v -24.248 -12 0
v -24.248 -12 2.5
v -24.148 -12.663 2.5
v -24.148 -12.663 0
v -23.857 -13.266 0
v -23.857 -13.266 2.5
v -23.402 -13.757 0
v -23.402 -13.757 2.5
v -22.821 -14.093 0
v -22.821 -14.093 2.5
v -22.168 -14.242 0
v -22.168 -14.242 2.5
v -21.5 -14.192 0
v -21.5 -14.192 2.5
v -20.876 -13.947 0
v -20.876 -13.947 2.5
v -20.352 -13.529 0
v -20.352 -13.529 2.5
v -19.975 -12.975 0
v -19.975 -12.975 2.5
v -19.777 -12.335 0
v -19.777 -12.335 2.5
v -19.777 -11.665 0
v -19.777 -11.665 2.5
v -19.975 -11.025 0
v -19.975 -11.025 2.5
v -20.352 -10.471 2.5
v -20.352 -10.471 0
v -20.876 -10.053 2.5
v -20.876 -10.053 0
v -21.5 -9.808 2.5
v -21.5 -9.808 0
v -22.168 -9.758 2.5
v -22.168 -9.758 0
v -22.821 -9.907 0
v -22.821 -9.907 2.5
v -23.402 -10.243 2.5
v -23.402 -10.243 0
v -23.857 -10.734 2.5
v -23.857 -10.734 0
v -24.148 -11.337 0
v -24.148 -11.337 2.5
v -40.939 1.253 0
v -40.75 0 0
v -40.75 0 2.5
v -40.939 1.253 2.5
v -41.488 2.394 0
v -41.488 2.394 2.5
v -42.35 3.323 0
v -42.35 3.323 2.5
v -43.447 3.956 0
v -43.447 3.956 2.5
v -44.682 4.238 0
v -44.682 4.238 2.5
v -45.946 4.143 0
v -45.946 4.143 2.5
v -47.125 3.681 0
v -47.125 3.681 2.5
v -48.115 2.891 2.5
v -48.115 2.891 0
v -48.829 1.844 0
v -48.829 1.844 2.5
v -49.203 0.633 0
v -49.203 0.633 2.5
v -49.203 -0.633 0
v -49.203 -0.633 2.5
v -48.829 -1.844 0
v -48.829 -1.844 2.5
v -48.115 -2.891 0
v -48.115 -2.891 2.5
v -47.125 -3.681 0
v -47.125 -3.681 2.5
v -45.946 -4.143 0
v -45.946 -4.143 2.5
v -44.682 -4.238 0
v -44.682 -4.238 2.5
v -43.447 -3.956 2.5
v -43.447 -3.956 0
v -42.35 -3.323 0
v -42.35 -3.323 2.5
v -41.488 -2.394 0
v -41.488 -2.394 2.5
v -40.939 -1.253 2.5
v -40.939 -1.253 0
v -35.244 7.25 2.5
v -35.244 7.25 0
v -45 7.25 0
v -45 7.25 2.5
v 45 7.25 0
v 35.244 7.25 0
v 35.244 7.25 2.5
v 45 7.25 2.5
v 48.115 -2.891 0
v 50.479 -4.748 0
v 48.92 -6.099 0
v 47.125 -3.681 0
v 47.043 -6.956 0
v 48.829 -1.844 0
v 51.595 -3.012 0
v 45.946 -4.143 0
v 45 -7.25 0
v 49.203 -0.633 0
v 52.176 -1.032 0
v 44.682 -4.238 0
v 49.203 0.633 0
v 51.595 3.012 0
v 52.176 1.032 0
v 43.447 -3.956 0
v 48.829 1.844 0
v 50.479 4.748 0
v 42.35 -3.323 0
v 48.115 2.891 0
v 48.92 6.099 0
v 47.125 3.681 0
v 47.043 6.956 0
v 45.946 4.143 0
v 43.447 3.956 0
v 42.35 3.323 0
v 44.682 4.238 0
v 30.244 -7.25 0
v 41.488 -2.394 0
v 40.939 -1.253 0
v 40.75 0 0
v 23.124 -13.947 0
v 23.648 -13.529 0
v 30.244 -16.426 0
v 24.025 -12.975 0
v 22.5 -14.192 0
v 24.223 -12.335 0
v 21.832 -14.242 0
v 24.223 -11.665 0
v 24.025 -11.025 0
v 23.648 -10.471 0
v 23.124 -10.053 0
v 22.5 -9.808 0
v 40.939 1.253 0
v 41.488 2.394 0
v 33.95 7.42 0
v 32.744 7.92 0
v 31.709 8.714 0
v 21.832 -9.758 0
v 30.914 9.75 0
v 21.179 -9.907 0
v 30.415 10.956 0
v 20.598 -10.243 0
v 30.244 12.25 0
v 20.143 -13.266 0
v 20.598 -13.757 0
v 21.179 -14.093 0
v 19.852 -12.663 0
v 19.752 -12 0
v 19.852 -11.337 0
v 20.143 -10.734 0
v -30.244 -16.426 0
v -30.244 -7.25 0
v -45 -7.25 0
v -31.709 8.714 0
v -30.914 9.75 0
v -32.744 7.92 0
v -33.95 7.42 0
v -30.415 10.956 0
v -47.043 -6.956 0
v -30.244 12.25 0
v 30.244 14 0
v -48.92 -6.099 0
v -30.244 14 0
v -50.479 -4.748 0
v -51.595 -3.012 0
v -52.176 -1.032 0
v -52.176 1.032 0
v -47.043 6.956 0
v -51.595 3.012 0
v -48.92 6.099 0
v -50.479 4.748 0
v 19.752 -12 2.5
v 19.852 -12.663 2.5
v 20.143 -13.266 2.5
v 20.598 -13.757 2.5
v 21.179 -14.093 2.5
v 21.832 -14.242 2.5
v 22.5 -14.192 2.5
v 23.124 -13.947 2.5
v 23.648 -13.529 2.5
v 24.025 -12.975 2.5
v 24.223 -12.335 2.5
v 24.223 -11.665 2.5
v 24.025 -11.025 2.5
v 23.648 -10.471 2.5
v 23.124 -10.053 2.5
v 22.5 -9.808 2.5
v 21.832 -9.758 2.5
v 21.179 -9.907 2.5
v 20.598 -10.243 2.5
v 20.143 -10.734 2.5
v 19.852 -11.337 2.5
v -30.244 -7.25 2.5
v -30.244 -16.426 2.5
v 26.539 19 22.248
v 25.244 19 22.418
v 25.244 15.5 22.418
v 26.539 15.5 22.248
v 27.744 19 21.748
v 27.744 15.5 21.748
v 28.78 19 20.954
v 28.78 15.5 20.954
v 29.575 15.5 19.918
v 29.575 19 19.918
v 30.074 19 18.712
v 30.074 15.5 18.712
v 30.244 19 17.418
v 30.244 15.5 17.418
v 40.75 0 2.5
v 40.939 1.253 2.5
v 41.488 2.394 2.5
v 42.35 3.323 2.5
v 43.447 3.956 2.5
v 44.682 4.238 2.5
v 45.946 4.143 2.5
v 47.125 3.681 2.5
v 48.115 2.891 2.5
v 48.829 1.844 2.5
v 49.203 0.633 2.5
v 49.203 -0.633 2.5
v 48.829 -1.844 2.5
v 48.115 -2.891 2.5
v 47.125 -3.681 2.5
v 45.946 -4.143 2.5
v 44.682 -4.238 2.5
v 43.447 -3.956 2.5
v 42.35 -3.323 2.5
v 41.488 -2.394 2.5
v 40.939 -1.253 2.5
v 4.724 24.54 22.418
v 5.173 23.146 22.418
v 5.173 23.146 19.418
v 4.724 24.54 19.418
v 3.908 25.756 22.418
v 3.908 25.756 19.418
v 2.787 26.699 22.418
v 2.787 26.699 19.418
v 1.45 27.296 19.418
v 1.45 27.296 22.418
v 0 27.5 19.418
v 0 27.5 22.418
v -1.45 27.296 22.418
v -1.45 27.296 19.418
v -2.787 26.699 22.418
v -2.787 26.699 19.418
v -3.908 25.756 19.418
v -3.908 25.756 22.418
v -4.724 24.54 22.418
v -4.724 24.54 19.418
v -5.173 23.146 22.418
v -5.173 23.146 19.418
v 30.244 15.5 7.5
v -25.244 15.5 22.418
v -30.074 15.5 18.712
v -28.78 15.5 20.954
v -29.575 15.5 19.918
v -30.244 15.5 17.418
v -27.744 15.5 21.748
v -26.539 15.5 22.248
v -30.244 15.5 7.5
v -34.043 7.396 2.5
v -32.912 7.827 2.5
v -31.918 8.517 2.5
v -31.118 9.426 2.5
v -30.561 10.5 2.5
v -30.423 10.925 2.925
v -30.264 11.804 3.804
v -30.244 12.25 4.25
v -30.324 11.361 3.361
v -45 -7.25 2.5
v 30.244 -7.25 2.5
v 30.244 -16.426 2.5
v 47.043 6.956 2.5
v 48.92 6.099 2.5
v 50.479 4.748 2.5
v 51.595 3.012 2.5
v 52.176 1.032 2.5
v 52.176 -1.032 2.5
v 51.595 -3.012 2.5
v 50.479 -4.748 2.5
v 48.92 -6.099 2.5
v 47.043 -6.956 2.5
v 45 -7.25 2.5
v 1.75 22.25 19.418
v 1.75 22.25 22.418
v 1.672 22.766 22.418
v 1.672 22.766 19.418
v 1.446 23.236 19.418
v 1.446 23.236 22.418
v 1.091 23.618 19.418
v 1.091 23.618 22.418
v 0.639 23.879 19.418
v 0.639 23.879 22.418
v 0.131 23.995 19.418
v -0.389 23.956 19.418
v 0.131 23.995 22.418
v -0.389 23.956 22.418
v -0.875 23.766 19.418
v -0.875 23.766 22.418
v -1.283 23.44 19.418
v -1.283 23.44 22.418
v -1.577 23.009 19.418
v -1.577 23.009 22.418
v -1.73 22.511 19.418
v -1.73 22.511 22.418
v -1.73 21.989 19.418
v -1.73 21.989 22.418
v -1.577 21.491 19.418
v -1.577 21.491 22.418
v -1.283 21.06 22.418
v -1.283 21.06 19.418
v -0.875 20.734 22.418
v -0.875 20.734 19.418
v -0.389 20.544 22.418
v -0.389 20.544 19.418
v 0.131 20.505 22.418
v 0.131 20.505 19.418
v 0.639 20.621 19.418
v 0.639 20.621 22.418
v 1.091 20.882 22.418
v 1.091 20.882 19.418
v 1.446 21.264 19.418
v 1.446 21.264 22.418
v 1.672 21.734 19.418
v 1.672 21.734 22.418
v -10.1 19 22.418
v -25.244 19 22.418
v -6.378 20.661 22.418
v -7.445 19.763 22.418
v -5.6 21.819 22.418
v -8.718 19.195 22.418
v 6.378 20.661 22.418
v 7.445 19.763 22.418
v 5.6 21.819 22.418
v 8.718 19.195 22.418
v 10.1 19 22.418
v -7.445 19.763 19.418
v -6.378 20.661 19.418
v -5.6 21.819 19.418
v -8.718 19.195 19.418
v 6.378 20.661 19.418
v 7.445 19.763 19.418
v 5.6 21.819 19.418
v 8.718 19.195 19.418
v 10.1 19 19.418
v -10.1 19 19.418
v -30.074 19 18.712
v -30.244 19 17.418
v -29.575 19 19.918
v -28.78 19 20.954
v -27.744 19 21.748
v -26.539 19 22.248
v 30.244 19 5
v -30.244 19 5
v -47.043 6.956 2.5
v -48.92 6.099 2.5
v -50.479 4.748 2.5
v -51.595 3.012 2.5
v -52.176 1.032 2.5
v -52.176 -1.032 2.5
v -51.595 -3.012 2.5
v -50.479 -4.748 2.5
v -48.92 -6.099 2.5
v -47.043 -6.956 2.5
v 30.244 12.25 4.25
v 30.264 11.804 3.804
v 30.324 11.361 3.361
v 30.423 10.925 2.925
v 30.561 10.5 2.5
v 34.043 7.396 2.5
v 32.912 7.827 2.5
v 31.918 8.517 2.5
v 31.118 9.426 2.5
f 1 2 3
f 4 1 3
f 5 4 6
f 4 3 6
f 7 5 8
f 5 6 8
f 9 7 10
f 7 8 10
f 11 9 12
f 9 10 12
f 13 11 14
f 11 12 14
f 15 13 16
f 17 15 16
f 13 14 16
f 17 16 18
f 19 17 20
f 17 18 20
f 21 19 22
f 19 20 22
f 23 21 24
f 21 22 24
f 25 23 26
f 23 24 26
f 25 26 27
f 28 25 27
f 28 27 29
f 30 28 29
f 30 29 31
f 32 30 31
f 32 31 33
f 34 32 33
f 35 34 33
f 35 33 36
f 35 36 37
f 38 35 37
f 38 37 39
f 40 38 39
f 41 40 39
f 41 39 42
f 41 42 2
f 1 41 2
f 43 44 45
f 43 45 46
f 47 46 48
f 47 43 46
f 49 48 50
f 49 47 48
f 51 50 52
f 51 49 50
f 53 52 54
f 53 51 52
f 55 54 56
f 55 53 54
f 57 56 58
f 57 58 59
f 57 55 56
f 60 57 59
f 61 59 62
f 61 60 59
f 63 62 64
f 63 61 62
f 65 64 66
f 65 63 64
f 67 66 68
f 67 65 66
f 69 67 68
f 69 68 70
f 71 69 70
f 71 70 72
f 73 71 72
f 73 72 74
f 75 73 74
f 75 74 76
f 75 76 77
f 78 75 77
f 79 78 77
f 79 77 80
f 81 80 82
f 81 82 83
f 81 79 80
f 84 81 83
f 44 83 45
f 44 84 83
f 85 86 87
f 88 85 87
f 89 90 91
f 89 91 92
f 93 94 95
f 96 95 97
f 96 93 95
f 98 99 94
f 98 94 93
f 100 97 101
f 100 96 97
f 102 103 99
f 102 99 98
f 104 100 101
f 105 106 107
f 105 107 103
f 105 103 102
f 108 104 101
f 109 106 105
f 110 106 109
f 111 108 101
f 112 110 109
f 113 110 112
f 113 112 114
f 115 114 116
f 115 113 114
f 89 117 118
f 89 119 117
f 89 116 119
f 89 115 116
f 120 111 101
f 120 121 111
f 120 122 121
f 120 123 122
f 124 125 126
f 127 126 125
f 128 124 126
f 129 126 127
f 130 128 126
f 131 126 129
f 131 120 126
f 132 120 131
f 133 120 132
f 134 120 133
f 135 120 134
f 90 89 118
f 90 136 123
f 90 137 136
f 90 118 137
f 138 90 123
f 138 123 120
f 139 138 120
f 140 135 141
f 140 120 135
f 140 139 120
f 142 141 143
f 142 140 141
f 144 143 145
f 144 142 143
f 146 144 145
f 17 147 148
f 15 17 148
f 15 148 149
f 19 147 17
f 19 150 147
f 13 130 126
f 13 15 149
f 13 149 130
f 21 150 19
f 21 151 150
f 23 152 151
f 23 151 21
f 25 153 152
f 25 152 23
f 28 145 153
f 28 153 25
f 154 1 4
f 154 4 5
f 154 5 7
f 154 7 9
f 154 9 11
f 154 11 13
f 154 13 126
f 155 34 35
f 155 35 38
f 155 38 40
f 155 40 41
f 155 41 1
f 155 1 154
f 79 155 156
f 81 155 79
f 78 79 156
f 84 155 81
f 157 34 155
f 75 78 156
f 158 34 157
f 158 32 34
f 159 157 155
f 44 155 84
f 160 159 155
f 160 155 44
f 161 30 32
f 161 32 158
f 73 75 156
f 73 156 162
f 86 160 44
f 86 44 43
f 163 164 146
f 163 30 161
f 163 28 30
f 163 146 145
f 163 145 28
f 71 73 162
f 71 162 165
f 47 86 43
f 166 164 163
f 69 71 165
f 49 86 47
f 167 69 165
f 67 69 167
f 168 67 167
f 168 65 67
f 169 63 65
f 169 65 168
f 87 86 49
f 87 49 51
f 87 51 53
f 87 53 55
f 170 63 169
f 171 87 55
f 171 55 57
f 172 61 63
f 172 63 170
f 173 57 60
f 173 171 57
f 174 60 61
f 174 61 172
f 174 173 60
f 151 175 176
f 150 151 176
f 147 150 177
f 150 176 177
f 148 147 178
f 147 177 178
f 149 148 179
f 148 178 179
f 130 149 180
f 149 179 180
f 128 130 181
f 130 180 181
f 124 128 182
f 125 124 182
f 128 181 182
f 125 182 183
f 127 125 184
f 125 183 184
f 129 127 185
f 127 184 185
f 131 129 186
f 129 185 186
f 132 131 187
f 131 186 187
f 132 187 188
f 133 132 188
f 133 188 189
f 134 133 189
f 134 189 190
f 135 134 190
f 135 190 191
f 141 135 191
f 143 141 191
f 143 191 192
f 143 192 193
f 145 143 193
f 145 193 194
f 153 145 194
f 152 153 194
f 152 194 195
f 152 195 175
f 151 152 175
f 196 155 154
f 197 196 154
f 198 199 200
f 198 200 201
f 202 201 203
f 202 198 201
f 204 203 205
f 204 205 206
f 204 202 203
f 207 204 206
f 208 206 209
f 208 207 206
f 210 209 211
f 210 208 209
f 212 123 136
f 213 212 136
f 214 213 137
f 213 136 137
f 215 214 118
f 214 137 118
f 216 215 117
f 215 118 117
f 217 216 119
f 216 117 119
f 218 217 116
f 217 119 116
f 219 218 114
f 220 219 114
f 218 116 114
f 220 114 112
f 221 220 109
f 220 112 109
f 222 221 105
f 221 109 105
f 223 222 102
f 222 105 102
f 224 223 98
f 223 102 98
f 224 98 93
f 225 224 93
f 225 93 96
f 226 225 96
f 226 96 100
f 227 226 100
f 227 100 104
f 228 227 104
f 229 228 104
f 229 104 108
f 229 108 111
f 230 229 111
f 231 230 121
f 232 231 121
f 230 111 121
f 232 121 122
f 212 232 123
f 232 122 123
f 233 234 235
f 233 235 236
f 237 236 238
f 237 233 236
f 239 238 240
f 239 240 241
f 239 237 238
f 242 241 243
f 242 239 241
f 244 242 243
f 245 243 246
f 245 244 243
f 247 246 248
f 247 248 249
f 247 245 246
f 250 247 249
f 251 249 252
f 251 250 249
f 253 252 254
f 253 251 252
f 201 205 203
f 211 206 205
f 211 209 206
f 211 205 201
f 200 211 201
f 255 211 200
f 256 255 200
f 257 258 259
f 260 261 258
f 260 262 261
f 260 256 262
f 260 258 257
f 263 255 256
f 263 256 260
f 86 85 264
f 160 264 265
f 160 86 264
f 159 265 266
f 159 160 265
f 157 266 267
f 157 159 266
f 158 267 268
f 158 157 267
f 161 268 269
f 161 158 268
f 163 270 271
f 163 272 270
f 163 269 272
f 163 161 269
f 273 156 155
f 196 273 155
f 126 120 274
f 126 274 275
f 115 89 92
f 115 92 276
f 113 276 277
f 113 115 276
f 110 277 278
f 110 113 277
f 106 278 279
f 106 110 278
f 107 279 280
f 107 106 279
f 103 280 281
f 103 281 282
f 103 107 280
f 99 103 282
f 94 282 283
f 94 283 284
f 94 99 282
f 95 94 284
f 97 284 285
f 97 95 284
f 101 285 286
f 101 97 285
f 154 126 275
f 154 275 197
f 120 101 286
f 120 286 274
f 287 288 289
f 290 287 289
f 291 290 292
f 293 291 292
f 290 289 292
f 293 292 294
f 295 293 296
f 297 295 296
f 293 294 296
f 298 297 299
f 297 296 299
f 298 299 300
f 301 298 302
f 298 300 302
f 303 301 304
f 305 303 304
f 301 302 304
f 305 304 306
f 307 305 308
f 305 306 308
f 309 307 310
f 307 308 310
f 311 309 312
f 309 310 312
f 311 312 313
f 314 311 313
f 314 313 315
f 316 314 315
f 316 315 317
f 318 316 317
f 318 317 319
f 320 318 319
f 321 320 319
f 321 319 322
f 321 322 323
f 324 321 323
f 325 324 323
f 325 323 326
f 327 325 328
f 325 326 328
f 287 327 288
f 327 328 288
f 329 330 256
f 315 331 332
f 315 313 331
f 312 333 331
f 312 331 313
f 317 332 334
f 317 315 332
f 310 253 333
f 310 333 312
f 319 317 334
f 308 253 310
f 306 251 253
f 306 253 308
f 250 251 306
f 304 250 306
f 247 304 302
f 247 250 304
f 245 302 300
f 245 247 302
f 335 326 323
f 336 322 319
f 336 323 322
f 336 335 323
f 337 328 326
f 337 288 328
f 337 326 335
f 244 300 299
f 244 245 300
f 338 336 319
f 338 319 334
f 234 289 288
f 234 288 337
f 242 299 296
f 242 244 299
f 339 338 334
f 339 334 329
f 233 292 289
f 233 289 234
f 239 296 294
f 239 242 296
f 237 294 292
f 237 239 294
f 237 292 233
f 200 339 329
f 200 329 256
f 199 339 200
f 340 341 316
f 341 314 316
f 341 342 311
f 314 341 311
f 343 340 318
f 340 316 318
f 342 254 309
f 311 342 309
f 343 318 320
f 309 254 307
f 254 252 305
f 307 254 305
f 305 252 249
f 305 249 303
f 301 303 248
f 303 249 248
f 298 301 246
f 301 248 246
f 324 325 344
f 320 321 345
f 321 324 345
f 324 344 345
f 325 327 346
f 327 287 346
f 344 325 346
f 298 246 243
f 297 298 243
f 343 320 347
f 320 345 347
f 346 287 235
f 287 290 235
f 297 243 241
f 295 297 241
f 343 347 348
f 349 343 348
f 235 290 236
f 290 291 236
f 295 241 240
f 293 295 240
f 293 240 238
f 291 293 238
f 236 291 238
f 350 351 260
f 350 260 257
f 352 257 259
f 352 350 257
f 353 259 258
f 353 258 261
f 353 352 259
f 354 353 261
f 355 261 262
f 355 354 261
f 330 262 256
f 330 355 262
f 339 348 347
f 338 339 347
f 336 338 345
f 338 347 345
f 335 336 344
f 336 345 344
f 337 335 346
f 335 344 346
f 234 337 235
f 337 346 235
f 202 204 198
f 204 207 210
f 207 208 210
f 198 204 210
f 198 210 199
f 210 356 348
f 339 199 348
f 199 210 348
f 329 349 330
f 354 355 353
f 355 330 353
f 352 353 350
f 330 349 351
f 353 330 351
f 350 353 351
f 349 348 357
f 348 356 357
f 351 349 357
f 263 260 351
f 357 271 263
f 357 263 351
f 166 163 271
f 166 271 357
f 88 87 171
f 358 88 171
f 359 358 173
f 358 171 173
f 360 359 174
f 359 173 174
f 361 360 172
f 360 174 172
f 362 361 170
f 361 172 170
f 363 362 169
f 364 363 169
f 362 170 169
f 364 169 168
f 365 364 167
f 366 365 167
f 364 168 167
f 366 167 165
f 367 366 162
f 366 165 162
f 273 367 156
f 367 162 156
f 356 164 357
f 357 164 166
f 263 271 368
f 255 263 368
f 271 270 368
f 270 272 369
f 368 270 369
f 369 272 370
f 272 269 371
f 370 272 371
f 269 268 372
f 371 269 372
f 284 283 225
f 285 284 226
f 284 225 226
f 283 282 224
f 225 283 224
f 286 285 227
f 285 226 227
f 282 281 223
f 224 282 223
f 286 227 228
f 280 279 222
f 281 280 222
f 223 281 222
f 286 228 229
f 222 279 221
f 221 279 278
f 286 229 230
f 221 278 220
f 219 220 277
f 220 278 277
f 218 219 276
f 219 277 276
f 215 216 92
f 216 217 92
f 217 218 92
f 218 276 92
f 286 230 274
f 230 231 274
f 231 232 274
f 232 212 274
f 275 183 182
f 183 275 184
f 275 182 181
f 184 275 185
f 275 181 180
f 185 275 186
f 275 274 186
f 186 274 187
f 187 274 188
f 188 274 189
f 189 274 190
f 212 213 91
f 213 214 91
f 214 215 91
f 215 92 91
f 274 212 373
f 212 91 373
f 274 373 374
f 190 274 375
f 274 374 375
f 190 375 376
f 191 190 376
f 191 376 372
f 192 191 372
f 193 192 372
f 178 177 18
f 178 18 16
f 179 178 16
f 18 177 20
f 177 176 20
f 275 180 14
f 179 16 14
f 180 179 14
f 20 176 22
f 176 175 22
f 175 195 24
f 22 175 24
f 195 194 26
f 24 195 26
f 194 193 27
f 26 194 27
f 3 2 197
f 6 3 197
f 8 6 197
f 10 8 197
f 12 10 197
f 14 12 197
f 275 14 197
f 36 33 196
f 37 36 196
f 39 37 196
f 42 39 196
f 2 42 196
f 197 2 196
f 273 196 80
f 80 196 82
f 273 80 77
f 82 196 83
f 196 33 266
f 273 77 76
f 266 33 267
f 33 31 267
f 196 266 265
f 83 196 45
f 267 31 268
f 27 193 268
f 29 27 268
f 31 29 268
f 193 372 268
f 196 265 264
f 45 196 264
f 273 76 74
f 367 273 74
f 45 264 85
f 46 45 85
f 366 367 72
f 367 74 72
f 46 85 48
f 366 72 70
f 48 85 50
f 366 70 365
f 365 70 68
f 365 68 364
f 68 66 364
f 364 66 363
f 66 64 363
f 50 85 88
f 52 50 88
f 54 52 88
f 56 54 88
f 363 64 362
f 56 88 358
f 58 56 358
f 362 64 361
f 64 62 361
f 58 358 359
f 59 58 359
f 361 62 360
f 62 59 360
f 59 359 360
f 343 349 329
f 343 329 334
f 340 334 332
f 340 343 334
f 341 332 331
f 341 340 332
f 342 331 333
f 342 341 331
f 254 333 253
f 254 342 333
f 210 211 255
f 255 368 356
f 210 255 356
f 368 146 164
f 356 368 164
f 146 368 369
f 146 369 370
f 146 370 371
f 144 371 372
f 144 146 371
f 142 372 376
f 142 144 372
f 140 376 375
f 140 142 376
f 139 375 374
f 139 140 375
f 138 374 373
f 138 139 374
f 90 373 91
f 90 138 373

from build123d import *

# Parameters (mm, degrees)
F0_R        = 4.25
F1_DEPTH    = 2.5
F2_W        = 30.2444149011
F2_H        = 3.5
F3_DEPTH    = 19.918
F5_R        = 1.75
F6_DEPTH    = 3
F8_D        = 4.4958
F9_T1_DEPTH = 2.5
F9_T3_DEPTH = 3
F9_T5_DEPTH = 28.5
F10_SIZE    = 5


# Not quite as in the source:
# - a fillet or chamfer that OpenCascade refuses, or shapes differently, is made with other operations: its cross-section is extruded or revolved along the edge and cut away or added


with BuildPart() as f1:
    # F0 (on Top) → F1 (new body)
    with BuildSketch(Plane.XY):
        with BuildLine():
            Line((-30.2444149011, 7.25), (-45, 7.25))
            ThreePointArc((-45, 7.25), (-52.25, 0), (-45, -7.25))
            Line((-45, -7.25), (-30.2444149011, -7.25))
            Line((-30.2444149011, -7.25), (-30.2444149011, -16.4255911708))
            Line((-30.2444149011, -16.4255911708), (0, -16.4255911708))
            Line((0, -16.4255911708), (0, 19))
            Line((0, 19), (-30.2444149011, 19))
            Line((-30.2444149011, 19), (-30.2444149011, 7.25))
        make_face()
        with Locations((-45, 0)):
            Circle(F0_R, mode=Mode.SUBTRACT)
    extrude(amount=F1_DEPTH)

    # F2 (on face) → F3 (join)
    with BuildSketch(Plane.XY.offset(2.5)):
        with Locations((-15.1222074506, 17.25)):
            Rectangle(F2_W, F2_H)
    extrude(amount=F3_DEPTH)

    # F4: F1 across plane


with BuildPart() as f1_1:
    add(f1.part)
    add(f1.part.mirror(Plane.YZ))

    # F5 (on face) → F6 (join)
    with BuildSketch(Plane.XY.offset(22.418)):
        with BuildLine():
            ThreePointArc((4.1231056256, 19), (4.9602824786, 20.5300878706), (5.25, 22.25))
            ThreePointArc((5.25, 22.25), (-1.7199121294, 27.2102824786), (-4.1231056256, 19))
            Line((-4.1231056256, 19), (4.1231056256, 19))
        make_face()
        with Locations((0, 22.25)):
            Circle(F5_R, mode=Mode.SUBTRACT)
    extrude(amount=-F6_DEPTH)

    # F8 (through all)
    with Locations(Plane(origin=(0, 0, 0), x_dir=(1, 0, 0), z_dir=(0, 0, -1))):
        with Locations((-22, 12), (22, 12)):
            Hole(F8_D / 2)

    # F9: fillet of radius 5 on 6 edges, made by hand

    # F9_s2 → F9_t1 (join)
    with BuildSketch(Plane.XY):
        with BuildLine():
            ThreePointArc((30.2444149011, 12.25), (31.7088809952, 8.7144660941), (35.2444149011, 7.25))
            Line((35.2444149011, 7.25), (30.2444149011, 7.25))
            Line((30.2444149011, 7.25), (30.2444149011, 12.25))
        make_face()
        with BuildLine():
            ThreePointArc((-35.2444149011, 7.25), (-31.7088809952, 8.7144660941), (-30.2444149011, 12.25))
            Line((-30.2444149011, 12.25), (-30.2444149011, 7.25))
            Line((-30.2444149011, 7.25), (-35.2444149011, 7.25))
        make_face()
    extrude(amount=F9_T1_DEPTH)

    # F9_s4 → F9_t3 (join)
    with BuildSketch(Plane.XY.offset(19.418)):
        with BuildLine():
            ThreePointArc((10.0995049384, 19), (6.8799003573, 20.1745397216), (5.1729171636, 23.1463414634))
            ThreePointArc((5.1729171636, 23.1463414634), (5.0894053491, 20.9614142663), (4.1231056256, 19))
            Line((4.1231056256, 19), (10.0995049384, 19))
        make_face()
        with BuildLine():
            ThreePointArc((-10.0995049384, 19), (-6.8799003573, 20.1745397216), (-5.1729171636, 23.1463414634))
            ThreePointArc((-5.1729171636, 23.1463414634), (-5.0894053491, 20.9614142663), (-4.1231056256, 19))
            Line((-4.1231056256, 19), (-10.0995049384, 19))
        make_face()
    extrude(amount=F9_T3_DEPTH)

    # F9_s6 → F9_t5 (cut)
    with BuildSketch(Plane.XZ.offset(-31.5)):
        with BuildLine():
            ThreePointArc((-30.2444149011, 17.418), (-28.7799488071, 20.9535339059), (-25.2444149011, 22.418))
            Line((-25.2444149011, 22.418), (-30.2444149011, 22.418))
            Line((-30.2444149011, 22.418), (-30.2444149011, 17.418))
        make_face()
        with BuildLine():
            ThreePointArc((25.2444149011, 22.418), (28.7799488071, 20.9535339059), (30.2444149011, 17.418))
            Line((30.2444149011, 17.418), (30.2444149011, 22.418))
            Line((30.2444149011, 22.418), (25.2444149011, 22.418))
        make_face()
    extrude(amount=F9_T5_DEPTH, mode=Mode.SUBTRACT)

    # F10
    f10_edges = [f1_1.edges().sort_by_distance(p)[0] for p in [
        (0, 19, 0),
        (0, 15.5, 2.5),
    ]]
    chamfer(f10_edges, length=F10_SIZE)


solid = f1_1.part
